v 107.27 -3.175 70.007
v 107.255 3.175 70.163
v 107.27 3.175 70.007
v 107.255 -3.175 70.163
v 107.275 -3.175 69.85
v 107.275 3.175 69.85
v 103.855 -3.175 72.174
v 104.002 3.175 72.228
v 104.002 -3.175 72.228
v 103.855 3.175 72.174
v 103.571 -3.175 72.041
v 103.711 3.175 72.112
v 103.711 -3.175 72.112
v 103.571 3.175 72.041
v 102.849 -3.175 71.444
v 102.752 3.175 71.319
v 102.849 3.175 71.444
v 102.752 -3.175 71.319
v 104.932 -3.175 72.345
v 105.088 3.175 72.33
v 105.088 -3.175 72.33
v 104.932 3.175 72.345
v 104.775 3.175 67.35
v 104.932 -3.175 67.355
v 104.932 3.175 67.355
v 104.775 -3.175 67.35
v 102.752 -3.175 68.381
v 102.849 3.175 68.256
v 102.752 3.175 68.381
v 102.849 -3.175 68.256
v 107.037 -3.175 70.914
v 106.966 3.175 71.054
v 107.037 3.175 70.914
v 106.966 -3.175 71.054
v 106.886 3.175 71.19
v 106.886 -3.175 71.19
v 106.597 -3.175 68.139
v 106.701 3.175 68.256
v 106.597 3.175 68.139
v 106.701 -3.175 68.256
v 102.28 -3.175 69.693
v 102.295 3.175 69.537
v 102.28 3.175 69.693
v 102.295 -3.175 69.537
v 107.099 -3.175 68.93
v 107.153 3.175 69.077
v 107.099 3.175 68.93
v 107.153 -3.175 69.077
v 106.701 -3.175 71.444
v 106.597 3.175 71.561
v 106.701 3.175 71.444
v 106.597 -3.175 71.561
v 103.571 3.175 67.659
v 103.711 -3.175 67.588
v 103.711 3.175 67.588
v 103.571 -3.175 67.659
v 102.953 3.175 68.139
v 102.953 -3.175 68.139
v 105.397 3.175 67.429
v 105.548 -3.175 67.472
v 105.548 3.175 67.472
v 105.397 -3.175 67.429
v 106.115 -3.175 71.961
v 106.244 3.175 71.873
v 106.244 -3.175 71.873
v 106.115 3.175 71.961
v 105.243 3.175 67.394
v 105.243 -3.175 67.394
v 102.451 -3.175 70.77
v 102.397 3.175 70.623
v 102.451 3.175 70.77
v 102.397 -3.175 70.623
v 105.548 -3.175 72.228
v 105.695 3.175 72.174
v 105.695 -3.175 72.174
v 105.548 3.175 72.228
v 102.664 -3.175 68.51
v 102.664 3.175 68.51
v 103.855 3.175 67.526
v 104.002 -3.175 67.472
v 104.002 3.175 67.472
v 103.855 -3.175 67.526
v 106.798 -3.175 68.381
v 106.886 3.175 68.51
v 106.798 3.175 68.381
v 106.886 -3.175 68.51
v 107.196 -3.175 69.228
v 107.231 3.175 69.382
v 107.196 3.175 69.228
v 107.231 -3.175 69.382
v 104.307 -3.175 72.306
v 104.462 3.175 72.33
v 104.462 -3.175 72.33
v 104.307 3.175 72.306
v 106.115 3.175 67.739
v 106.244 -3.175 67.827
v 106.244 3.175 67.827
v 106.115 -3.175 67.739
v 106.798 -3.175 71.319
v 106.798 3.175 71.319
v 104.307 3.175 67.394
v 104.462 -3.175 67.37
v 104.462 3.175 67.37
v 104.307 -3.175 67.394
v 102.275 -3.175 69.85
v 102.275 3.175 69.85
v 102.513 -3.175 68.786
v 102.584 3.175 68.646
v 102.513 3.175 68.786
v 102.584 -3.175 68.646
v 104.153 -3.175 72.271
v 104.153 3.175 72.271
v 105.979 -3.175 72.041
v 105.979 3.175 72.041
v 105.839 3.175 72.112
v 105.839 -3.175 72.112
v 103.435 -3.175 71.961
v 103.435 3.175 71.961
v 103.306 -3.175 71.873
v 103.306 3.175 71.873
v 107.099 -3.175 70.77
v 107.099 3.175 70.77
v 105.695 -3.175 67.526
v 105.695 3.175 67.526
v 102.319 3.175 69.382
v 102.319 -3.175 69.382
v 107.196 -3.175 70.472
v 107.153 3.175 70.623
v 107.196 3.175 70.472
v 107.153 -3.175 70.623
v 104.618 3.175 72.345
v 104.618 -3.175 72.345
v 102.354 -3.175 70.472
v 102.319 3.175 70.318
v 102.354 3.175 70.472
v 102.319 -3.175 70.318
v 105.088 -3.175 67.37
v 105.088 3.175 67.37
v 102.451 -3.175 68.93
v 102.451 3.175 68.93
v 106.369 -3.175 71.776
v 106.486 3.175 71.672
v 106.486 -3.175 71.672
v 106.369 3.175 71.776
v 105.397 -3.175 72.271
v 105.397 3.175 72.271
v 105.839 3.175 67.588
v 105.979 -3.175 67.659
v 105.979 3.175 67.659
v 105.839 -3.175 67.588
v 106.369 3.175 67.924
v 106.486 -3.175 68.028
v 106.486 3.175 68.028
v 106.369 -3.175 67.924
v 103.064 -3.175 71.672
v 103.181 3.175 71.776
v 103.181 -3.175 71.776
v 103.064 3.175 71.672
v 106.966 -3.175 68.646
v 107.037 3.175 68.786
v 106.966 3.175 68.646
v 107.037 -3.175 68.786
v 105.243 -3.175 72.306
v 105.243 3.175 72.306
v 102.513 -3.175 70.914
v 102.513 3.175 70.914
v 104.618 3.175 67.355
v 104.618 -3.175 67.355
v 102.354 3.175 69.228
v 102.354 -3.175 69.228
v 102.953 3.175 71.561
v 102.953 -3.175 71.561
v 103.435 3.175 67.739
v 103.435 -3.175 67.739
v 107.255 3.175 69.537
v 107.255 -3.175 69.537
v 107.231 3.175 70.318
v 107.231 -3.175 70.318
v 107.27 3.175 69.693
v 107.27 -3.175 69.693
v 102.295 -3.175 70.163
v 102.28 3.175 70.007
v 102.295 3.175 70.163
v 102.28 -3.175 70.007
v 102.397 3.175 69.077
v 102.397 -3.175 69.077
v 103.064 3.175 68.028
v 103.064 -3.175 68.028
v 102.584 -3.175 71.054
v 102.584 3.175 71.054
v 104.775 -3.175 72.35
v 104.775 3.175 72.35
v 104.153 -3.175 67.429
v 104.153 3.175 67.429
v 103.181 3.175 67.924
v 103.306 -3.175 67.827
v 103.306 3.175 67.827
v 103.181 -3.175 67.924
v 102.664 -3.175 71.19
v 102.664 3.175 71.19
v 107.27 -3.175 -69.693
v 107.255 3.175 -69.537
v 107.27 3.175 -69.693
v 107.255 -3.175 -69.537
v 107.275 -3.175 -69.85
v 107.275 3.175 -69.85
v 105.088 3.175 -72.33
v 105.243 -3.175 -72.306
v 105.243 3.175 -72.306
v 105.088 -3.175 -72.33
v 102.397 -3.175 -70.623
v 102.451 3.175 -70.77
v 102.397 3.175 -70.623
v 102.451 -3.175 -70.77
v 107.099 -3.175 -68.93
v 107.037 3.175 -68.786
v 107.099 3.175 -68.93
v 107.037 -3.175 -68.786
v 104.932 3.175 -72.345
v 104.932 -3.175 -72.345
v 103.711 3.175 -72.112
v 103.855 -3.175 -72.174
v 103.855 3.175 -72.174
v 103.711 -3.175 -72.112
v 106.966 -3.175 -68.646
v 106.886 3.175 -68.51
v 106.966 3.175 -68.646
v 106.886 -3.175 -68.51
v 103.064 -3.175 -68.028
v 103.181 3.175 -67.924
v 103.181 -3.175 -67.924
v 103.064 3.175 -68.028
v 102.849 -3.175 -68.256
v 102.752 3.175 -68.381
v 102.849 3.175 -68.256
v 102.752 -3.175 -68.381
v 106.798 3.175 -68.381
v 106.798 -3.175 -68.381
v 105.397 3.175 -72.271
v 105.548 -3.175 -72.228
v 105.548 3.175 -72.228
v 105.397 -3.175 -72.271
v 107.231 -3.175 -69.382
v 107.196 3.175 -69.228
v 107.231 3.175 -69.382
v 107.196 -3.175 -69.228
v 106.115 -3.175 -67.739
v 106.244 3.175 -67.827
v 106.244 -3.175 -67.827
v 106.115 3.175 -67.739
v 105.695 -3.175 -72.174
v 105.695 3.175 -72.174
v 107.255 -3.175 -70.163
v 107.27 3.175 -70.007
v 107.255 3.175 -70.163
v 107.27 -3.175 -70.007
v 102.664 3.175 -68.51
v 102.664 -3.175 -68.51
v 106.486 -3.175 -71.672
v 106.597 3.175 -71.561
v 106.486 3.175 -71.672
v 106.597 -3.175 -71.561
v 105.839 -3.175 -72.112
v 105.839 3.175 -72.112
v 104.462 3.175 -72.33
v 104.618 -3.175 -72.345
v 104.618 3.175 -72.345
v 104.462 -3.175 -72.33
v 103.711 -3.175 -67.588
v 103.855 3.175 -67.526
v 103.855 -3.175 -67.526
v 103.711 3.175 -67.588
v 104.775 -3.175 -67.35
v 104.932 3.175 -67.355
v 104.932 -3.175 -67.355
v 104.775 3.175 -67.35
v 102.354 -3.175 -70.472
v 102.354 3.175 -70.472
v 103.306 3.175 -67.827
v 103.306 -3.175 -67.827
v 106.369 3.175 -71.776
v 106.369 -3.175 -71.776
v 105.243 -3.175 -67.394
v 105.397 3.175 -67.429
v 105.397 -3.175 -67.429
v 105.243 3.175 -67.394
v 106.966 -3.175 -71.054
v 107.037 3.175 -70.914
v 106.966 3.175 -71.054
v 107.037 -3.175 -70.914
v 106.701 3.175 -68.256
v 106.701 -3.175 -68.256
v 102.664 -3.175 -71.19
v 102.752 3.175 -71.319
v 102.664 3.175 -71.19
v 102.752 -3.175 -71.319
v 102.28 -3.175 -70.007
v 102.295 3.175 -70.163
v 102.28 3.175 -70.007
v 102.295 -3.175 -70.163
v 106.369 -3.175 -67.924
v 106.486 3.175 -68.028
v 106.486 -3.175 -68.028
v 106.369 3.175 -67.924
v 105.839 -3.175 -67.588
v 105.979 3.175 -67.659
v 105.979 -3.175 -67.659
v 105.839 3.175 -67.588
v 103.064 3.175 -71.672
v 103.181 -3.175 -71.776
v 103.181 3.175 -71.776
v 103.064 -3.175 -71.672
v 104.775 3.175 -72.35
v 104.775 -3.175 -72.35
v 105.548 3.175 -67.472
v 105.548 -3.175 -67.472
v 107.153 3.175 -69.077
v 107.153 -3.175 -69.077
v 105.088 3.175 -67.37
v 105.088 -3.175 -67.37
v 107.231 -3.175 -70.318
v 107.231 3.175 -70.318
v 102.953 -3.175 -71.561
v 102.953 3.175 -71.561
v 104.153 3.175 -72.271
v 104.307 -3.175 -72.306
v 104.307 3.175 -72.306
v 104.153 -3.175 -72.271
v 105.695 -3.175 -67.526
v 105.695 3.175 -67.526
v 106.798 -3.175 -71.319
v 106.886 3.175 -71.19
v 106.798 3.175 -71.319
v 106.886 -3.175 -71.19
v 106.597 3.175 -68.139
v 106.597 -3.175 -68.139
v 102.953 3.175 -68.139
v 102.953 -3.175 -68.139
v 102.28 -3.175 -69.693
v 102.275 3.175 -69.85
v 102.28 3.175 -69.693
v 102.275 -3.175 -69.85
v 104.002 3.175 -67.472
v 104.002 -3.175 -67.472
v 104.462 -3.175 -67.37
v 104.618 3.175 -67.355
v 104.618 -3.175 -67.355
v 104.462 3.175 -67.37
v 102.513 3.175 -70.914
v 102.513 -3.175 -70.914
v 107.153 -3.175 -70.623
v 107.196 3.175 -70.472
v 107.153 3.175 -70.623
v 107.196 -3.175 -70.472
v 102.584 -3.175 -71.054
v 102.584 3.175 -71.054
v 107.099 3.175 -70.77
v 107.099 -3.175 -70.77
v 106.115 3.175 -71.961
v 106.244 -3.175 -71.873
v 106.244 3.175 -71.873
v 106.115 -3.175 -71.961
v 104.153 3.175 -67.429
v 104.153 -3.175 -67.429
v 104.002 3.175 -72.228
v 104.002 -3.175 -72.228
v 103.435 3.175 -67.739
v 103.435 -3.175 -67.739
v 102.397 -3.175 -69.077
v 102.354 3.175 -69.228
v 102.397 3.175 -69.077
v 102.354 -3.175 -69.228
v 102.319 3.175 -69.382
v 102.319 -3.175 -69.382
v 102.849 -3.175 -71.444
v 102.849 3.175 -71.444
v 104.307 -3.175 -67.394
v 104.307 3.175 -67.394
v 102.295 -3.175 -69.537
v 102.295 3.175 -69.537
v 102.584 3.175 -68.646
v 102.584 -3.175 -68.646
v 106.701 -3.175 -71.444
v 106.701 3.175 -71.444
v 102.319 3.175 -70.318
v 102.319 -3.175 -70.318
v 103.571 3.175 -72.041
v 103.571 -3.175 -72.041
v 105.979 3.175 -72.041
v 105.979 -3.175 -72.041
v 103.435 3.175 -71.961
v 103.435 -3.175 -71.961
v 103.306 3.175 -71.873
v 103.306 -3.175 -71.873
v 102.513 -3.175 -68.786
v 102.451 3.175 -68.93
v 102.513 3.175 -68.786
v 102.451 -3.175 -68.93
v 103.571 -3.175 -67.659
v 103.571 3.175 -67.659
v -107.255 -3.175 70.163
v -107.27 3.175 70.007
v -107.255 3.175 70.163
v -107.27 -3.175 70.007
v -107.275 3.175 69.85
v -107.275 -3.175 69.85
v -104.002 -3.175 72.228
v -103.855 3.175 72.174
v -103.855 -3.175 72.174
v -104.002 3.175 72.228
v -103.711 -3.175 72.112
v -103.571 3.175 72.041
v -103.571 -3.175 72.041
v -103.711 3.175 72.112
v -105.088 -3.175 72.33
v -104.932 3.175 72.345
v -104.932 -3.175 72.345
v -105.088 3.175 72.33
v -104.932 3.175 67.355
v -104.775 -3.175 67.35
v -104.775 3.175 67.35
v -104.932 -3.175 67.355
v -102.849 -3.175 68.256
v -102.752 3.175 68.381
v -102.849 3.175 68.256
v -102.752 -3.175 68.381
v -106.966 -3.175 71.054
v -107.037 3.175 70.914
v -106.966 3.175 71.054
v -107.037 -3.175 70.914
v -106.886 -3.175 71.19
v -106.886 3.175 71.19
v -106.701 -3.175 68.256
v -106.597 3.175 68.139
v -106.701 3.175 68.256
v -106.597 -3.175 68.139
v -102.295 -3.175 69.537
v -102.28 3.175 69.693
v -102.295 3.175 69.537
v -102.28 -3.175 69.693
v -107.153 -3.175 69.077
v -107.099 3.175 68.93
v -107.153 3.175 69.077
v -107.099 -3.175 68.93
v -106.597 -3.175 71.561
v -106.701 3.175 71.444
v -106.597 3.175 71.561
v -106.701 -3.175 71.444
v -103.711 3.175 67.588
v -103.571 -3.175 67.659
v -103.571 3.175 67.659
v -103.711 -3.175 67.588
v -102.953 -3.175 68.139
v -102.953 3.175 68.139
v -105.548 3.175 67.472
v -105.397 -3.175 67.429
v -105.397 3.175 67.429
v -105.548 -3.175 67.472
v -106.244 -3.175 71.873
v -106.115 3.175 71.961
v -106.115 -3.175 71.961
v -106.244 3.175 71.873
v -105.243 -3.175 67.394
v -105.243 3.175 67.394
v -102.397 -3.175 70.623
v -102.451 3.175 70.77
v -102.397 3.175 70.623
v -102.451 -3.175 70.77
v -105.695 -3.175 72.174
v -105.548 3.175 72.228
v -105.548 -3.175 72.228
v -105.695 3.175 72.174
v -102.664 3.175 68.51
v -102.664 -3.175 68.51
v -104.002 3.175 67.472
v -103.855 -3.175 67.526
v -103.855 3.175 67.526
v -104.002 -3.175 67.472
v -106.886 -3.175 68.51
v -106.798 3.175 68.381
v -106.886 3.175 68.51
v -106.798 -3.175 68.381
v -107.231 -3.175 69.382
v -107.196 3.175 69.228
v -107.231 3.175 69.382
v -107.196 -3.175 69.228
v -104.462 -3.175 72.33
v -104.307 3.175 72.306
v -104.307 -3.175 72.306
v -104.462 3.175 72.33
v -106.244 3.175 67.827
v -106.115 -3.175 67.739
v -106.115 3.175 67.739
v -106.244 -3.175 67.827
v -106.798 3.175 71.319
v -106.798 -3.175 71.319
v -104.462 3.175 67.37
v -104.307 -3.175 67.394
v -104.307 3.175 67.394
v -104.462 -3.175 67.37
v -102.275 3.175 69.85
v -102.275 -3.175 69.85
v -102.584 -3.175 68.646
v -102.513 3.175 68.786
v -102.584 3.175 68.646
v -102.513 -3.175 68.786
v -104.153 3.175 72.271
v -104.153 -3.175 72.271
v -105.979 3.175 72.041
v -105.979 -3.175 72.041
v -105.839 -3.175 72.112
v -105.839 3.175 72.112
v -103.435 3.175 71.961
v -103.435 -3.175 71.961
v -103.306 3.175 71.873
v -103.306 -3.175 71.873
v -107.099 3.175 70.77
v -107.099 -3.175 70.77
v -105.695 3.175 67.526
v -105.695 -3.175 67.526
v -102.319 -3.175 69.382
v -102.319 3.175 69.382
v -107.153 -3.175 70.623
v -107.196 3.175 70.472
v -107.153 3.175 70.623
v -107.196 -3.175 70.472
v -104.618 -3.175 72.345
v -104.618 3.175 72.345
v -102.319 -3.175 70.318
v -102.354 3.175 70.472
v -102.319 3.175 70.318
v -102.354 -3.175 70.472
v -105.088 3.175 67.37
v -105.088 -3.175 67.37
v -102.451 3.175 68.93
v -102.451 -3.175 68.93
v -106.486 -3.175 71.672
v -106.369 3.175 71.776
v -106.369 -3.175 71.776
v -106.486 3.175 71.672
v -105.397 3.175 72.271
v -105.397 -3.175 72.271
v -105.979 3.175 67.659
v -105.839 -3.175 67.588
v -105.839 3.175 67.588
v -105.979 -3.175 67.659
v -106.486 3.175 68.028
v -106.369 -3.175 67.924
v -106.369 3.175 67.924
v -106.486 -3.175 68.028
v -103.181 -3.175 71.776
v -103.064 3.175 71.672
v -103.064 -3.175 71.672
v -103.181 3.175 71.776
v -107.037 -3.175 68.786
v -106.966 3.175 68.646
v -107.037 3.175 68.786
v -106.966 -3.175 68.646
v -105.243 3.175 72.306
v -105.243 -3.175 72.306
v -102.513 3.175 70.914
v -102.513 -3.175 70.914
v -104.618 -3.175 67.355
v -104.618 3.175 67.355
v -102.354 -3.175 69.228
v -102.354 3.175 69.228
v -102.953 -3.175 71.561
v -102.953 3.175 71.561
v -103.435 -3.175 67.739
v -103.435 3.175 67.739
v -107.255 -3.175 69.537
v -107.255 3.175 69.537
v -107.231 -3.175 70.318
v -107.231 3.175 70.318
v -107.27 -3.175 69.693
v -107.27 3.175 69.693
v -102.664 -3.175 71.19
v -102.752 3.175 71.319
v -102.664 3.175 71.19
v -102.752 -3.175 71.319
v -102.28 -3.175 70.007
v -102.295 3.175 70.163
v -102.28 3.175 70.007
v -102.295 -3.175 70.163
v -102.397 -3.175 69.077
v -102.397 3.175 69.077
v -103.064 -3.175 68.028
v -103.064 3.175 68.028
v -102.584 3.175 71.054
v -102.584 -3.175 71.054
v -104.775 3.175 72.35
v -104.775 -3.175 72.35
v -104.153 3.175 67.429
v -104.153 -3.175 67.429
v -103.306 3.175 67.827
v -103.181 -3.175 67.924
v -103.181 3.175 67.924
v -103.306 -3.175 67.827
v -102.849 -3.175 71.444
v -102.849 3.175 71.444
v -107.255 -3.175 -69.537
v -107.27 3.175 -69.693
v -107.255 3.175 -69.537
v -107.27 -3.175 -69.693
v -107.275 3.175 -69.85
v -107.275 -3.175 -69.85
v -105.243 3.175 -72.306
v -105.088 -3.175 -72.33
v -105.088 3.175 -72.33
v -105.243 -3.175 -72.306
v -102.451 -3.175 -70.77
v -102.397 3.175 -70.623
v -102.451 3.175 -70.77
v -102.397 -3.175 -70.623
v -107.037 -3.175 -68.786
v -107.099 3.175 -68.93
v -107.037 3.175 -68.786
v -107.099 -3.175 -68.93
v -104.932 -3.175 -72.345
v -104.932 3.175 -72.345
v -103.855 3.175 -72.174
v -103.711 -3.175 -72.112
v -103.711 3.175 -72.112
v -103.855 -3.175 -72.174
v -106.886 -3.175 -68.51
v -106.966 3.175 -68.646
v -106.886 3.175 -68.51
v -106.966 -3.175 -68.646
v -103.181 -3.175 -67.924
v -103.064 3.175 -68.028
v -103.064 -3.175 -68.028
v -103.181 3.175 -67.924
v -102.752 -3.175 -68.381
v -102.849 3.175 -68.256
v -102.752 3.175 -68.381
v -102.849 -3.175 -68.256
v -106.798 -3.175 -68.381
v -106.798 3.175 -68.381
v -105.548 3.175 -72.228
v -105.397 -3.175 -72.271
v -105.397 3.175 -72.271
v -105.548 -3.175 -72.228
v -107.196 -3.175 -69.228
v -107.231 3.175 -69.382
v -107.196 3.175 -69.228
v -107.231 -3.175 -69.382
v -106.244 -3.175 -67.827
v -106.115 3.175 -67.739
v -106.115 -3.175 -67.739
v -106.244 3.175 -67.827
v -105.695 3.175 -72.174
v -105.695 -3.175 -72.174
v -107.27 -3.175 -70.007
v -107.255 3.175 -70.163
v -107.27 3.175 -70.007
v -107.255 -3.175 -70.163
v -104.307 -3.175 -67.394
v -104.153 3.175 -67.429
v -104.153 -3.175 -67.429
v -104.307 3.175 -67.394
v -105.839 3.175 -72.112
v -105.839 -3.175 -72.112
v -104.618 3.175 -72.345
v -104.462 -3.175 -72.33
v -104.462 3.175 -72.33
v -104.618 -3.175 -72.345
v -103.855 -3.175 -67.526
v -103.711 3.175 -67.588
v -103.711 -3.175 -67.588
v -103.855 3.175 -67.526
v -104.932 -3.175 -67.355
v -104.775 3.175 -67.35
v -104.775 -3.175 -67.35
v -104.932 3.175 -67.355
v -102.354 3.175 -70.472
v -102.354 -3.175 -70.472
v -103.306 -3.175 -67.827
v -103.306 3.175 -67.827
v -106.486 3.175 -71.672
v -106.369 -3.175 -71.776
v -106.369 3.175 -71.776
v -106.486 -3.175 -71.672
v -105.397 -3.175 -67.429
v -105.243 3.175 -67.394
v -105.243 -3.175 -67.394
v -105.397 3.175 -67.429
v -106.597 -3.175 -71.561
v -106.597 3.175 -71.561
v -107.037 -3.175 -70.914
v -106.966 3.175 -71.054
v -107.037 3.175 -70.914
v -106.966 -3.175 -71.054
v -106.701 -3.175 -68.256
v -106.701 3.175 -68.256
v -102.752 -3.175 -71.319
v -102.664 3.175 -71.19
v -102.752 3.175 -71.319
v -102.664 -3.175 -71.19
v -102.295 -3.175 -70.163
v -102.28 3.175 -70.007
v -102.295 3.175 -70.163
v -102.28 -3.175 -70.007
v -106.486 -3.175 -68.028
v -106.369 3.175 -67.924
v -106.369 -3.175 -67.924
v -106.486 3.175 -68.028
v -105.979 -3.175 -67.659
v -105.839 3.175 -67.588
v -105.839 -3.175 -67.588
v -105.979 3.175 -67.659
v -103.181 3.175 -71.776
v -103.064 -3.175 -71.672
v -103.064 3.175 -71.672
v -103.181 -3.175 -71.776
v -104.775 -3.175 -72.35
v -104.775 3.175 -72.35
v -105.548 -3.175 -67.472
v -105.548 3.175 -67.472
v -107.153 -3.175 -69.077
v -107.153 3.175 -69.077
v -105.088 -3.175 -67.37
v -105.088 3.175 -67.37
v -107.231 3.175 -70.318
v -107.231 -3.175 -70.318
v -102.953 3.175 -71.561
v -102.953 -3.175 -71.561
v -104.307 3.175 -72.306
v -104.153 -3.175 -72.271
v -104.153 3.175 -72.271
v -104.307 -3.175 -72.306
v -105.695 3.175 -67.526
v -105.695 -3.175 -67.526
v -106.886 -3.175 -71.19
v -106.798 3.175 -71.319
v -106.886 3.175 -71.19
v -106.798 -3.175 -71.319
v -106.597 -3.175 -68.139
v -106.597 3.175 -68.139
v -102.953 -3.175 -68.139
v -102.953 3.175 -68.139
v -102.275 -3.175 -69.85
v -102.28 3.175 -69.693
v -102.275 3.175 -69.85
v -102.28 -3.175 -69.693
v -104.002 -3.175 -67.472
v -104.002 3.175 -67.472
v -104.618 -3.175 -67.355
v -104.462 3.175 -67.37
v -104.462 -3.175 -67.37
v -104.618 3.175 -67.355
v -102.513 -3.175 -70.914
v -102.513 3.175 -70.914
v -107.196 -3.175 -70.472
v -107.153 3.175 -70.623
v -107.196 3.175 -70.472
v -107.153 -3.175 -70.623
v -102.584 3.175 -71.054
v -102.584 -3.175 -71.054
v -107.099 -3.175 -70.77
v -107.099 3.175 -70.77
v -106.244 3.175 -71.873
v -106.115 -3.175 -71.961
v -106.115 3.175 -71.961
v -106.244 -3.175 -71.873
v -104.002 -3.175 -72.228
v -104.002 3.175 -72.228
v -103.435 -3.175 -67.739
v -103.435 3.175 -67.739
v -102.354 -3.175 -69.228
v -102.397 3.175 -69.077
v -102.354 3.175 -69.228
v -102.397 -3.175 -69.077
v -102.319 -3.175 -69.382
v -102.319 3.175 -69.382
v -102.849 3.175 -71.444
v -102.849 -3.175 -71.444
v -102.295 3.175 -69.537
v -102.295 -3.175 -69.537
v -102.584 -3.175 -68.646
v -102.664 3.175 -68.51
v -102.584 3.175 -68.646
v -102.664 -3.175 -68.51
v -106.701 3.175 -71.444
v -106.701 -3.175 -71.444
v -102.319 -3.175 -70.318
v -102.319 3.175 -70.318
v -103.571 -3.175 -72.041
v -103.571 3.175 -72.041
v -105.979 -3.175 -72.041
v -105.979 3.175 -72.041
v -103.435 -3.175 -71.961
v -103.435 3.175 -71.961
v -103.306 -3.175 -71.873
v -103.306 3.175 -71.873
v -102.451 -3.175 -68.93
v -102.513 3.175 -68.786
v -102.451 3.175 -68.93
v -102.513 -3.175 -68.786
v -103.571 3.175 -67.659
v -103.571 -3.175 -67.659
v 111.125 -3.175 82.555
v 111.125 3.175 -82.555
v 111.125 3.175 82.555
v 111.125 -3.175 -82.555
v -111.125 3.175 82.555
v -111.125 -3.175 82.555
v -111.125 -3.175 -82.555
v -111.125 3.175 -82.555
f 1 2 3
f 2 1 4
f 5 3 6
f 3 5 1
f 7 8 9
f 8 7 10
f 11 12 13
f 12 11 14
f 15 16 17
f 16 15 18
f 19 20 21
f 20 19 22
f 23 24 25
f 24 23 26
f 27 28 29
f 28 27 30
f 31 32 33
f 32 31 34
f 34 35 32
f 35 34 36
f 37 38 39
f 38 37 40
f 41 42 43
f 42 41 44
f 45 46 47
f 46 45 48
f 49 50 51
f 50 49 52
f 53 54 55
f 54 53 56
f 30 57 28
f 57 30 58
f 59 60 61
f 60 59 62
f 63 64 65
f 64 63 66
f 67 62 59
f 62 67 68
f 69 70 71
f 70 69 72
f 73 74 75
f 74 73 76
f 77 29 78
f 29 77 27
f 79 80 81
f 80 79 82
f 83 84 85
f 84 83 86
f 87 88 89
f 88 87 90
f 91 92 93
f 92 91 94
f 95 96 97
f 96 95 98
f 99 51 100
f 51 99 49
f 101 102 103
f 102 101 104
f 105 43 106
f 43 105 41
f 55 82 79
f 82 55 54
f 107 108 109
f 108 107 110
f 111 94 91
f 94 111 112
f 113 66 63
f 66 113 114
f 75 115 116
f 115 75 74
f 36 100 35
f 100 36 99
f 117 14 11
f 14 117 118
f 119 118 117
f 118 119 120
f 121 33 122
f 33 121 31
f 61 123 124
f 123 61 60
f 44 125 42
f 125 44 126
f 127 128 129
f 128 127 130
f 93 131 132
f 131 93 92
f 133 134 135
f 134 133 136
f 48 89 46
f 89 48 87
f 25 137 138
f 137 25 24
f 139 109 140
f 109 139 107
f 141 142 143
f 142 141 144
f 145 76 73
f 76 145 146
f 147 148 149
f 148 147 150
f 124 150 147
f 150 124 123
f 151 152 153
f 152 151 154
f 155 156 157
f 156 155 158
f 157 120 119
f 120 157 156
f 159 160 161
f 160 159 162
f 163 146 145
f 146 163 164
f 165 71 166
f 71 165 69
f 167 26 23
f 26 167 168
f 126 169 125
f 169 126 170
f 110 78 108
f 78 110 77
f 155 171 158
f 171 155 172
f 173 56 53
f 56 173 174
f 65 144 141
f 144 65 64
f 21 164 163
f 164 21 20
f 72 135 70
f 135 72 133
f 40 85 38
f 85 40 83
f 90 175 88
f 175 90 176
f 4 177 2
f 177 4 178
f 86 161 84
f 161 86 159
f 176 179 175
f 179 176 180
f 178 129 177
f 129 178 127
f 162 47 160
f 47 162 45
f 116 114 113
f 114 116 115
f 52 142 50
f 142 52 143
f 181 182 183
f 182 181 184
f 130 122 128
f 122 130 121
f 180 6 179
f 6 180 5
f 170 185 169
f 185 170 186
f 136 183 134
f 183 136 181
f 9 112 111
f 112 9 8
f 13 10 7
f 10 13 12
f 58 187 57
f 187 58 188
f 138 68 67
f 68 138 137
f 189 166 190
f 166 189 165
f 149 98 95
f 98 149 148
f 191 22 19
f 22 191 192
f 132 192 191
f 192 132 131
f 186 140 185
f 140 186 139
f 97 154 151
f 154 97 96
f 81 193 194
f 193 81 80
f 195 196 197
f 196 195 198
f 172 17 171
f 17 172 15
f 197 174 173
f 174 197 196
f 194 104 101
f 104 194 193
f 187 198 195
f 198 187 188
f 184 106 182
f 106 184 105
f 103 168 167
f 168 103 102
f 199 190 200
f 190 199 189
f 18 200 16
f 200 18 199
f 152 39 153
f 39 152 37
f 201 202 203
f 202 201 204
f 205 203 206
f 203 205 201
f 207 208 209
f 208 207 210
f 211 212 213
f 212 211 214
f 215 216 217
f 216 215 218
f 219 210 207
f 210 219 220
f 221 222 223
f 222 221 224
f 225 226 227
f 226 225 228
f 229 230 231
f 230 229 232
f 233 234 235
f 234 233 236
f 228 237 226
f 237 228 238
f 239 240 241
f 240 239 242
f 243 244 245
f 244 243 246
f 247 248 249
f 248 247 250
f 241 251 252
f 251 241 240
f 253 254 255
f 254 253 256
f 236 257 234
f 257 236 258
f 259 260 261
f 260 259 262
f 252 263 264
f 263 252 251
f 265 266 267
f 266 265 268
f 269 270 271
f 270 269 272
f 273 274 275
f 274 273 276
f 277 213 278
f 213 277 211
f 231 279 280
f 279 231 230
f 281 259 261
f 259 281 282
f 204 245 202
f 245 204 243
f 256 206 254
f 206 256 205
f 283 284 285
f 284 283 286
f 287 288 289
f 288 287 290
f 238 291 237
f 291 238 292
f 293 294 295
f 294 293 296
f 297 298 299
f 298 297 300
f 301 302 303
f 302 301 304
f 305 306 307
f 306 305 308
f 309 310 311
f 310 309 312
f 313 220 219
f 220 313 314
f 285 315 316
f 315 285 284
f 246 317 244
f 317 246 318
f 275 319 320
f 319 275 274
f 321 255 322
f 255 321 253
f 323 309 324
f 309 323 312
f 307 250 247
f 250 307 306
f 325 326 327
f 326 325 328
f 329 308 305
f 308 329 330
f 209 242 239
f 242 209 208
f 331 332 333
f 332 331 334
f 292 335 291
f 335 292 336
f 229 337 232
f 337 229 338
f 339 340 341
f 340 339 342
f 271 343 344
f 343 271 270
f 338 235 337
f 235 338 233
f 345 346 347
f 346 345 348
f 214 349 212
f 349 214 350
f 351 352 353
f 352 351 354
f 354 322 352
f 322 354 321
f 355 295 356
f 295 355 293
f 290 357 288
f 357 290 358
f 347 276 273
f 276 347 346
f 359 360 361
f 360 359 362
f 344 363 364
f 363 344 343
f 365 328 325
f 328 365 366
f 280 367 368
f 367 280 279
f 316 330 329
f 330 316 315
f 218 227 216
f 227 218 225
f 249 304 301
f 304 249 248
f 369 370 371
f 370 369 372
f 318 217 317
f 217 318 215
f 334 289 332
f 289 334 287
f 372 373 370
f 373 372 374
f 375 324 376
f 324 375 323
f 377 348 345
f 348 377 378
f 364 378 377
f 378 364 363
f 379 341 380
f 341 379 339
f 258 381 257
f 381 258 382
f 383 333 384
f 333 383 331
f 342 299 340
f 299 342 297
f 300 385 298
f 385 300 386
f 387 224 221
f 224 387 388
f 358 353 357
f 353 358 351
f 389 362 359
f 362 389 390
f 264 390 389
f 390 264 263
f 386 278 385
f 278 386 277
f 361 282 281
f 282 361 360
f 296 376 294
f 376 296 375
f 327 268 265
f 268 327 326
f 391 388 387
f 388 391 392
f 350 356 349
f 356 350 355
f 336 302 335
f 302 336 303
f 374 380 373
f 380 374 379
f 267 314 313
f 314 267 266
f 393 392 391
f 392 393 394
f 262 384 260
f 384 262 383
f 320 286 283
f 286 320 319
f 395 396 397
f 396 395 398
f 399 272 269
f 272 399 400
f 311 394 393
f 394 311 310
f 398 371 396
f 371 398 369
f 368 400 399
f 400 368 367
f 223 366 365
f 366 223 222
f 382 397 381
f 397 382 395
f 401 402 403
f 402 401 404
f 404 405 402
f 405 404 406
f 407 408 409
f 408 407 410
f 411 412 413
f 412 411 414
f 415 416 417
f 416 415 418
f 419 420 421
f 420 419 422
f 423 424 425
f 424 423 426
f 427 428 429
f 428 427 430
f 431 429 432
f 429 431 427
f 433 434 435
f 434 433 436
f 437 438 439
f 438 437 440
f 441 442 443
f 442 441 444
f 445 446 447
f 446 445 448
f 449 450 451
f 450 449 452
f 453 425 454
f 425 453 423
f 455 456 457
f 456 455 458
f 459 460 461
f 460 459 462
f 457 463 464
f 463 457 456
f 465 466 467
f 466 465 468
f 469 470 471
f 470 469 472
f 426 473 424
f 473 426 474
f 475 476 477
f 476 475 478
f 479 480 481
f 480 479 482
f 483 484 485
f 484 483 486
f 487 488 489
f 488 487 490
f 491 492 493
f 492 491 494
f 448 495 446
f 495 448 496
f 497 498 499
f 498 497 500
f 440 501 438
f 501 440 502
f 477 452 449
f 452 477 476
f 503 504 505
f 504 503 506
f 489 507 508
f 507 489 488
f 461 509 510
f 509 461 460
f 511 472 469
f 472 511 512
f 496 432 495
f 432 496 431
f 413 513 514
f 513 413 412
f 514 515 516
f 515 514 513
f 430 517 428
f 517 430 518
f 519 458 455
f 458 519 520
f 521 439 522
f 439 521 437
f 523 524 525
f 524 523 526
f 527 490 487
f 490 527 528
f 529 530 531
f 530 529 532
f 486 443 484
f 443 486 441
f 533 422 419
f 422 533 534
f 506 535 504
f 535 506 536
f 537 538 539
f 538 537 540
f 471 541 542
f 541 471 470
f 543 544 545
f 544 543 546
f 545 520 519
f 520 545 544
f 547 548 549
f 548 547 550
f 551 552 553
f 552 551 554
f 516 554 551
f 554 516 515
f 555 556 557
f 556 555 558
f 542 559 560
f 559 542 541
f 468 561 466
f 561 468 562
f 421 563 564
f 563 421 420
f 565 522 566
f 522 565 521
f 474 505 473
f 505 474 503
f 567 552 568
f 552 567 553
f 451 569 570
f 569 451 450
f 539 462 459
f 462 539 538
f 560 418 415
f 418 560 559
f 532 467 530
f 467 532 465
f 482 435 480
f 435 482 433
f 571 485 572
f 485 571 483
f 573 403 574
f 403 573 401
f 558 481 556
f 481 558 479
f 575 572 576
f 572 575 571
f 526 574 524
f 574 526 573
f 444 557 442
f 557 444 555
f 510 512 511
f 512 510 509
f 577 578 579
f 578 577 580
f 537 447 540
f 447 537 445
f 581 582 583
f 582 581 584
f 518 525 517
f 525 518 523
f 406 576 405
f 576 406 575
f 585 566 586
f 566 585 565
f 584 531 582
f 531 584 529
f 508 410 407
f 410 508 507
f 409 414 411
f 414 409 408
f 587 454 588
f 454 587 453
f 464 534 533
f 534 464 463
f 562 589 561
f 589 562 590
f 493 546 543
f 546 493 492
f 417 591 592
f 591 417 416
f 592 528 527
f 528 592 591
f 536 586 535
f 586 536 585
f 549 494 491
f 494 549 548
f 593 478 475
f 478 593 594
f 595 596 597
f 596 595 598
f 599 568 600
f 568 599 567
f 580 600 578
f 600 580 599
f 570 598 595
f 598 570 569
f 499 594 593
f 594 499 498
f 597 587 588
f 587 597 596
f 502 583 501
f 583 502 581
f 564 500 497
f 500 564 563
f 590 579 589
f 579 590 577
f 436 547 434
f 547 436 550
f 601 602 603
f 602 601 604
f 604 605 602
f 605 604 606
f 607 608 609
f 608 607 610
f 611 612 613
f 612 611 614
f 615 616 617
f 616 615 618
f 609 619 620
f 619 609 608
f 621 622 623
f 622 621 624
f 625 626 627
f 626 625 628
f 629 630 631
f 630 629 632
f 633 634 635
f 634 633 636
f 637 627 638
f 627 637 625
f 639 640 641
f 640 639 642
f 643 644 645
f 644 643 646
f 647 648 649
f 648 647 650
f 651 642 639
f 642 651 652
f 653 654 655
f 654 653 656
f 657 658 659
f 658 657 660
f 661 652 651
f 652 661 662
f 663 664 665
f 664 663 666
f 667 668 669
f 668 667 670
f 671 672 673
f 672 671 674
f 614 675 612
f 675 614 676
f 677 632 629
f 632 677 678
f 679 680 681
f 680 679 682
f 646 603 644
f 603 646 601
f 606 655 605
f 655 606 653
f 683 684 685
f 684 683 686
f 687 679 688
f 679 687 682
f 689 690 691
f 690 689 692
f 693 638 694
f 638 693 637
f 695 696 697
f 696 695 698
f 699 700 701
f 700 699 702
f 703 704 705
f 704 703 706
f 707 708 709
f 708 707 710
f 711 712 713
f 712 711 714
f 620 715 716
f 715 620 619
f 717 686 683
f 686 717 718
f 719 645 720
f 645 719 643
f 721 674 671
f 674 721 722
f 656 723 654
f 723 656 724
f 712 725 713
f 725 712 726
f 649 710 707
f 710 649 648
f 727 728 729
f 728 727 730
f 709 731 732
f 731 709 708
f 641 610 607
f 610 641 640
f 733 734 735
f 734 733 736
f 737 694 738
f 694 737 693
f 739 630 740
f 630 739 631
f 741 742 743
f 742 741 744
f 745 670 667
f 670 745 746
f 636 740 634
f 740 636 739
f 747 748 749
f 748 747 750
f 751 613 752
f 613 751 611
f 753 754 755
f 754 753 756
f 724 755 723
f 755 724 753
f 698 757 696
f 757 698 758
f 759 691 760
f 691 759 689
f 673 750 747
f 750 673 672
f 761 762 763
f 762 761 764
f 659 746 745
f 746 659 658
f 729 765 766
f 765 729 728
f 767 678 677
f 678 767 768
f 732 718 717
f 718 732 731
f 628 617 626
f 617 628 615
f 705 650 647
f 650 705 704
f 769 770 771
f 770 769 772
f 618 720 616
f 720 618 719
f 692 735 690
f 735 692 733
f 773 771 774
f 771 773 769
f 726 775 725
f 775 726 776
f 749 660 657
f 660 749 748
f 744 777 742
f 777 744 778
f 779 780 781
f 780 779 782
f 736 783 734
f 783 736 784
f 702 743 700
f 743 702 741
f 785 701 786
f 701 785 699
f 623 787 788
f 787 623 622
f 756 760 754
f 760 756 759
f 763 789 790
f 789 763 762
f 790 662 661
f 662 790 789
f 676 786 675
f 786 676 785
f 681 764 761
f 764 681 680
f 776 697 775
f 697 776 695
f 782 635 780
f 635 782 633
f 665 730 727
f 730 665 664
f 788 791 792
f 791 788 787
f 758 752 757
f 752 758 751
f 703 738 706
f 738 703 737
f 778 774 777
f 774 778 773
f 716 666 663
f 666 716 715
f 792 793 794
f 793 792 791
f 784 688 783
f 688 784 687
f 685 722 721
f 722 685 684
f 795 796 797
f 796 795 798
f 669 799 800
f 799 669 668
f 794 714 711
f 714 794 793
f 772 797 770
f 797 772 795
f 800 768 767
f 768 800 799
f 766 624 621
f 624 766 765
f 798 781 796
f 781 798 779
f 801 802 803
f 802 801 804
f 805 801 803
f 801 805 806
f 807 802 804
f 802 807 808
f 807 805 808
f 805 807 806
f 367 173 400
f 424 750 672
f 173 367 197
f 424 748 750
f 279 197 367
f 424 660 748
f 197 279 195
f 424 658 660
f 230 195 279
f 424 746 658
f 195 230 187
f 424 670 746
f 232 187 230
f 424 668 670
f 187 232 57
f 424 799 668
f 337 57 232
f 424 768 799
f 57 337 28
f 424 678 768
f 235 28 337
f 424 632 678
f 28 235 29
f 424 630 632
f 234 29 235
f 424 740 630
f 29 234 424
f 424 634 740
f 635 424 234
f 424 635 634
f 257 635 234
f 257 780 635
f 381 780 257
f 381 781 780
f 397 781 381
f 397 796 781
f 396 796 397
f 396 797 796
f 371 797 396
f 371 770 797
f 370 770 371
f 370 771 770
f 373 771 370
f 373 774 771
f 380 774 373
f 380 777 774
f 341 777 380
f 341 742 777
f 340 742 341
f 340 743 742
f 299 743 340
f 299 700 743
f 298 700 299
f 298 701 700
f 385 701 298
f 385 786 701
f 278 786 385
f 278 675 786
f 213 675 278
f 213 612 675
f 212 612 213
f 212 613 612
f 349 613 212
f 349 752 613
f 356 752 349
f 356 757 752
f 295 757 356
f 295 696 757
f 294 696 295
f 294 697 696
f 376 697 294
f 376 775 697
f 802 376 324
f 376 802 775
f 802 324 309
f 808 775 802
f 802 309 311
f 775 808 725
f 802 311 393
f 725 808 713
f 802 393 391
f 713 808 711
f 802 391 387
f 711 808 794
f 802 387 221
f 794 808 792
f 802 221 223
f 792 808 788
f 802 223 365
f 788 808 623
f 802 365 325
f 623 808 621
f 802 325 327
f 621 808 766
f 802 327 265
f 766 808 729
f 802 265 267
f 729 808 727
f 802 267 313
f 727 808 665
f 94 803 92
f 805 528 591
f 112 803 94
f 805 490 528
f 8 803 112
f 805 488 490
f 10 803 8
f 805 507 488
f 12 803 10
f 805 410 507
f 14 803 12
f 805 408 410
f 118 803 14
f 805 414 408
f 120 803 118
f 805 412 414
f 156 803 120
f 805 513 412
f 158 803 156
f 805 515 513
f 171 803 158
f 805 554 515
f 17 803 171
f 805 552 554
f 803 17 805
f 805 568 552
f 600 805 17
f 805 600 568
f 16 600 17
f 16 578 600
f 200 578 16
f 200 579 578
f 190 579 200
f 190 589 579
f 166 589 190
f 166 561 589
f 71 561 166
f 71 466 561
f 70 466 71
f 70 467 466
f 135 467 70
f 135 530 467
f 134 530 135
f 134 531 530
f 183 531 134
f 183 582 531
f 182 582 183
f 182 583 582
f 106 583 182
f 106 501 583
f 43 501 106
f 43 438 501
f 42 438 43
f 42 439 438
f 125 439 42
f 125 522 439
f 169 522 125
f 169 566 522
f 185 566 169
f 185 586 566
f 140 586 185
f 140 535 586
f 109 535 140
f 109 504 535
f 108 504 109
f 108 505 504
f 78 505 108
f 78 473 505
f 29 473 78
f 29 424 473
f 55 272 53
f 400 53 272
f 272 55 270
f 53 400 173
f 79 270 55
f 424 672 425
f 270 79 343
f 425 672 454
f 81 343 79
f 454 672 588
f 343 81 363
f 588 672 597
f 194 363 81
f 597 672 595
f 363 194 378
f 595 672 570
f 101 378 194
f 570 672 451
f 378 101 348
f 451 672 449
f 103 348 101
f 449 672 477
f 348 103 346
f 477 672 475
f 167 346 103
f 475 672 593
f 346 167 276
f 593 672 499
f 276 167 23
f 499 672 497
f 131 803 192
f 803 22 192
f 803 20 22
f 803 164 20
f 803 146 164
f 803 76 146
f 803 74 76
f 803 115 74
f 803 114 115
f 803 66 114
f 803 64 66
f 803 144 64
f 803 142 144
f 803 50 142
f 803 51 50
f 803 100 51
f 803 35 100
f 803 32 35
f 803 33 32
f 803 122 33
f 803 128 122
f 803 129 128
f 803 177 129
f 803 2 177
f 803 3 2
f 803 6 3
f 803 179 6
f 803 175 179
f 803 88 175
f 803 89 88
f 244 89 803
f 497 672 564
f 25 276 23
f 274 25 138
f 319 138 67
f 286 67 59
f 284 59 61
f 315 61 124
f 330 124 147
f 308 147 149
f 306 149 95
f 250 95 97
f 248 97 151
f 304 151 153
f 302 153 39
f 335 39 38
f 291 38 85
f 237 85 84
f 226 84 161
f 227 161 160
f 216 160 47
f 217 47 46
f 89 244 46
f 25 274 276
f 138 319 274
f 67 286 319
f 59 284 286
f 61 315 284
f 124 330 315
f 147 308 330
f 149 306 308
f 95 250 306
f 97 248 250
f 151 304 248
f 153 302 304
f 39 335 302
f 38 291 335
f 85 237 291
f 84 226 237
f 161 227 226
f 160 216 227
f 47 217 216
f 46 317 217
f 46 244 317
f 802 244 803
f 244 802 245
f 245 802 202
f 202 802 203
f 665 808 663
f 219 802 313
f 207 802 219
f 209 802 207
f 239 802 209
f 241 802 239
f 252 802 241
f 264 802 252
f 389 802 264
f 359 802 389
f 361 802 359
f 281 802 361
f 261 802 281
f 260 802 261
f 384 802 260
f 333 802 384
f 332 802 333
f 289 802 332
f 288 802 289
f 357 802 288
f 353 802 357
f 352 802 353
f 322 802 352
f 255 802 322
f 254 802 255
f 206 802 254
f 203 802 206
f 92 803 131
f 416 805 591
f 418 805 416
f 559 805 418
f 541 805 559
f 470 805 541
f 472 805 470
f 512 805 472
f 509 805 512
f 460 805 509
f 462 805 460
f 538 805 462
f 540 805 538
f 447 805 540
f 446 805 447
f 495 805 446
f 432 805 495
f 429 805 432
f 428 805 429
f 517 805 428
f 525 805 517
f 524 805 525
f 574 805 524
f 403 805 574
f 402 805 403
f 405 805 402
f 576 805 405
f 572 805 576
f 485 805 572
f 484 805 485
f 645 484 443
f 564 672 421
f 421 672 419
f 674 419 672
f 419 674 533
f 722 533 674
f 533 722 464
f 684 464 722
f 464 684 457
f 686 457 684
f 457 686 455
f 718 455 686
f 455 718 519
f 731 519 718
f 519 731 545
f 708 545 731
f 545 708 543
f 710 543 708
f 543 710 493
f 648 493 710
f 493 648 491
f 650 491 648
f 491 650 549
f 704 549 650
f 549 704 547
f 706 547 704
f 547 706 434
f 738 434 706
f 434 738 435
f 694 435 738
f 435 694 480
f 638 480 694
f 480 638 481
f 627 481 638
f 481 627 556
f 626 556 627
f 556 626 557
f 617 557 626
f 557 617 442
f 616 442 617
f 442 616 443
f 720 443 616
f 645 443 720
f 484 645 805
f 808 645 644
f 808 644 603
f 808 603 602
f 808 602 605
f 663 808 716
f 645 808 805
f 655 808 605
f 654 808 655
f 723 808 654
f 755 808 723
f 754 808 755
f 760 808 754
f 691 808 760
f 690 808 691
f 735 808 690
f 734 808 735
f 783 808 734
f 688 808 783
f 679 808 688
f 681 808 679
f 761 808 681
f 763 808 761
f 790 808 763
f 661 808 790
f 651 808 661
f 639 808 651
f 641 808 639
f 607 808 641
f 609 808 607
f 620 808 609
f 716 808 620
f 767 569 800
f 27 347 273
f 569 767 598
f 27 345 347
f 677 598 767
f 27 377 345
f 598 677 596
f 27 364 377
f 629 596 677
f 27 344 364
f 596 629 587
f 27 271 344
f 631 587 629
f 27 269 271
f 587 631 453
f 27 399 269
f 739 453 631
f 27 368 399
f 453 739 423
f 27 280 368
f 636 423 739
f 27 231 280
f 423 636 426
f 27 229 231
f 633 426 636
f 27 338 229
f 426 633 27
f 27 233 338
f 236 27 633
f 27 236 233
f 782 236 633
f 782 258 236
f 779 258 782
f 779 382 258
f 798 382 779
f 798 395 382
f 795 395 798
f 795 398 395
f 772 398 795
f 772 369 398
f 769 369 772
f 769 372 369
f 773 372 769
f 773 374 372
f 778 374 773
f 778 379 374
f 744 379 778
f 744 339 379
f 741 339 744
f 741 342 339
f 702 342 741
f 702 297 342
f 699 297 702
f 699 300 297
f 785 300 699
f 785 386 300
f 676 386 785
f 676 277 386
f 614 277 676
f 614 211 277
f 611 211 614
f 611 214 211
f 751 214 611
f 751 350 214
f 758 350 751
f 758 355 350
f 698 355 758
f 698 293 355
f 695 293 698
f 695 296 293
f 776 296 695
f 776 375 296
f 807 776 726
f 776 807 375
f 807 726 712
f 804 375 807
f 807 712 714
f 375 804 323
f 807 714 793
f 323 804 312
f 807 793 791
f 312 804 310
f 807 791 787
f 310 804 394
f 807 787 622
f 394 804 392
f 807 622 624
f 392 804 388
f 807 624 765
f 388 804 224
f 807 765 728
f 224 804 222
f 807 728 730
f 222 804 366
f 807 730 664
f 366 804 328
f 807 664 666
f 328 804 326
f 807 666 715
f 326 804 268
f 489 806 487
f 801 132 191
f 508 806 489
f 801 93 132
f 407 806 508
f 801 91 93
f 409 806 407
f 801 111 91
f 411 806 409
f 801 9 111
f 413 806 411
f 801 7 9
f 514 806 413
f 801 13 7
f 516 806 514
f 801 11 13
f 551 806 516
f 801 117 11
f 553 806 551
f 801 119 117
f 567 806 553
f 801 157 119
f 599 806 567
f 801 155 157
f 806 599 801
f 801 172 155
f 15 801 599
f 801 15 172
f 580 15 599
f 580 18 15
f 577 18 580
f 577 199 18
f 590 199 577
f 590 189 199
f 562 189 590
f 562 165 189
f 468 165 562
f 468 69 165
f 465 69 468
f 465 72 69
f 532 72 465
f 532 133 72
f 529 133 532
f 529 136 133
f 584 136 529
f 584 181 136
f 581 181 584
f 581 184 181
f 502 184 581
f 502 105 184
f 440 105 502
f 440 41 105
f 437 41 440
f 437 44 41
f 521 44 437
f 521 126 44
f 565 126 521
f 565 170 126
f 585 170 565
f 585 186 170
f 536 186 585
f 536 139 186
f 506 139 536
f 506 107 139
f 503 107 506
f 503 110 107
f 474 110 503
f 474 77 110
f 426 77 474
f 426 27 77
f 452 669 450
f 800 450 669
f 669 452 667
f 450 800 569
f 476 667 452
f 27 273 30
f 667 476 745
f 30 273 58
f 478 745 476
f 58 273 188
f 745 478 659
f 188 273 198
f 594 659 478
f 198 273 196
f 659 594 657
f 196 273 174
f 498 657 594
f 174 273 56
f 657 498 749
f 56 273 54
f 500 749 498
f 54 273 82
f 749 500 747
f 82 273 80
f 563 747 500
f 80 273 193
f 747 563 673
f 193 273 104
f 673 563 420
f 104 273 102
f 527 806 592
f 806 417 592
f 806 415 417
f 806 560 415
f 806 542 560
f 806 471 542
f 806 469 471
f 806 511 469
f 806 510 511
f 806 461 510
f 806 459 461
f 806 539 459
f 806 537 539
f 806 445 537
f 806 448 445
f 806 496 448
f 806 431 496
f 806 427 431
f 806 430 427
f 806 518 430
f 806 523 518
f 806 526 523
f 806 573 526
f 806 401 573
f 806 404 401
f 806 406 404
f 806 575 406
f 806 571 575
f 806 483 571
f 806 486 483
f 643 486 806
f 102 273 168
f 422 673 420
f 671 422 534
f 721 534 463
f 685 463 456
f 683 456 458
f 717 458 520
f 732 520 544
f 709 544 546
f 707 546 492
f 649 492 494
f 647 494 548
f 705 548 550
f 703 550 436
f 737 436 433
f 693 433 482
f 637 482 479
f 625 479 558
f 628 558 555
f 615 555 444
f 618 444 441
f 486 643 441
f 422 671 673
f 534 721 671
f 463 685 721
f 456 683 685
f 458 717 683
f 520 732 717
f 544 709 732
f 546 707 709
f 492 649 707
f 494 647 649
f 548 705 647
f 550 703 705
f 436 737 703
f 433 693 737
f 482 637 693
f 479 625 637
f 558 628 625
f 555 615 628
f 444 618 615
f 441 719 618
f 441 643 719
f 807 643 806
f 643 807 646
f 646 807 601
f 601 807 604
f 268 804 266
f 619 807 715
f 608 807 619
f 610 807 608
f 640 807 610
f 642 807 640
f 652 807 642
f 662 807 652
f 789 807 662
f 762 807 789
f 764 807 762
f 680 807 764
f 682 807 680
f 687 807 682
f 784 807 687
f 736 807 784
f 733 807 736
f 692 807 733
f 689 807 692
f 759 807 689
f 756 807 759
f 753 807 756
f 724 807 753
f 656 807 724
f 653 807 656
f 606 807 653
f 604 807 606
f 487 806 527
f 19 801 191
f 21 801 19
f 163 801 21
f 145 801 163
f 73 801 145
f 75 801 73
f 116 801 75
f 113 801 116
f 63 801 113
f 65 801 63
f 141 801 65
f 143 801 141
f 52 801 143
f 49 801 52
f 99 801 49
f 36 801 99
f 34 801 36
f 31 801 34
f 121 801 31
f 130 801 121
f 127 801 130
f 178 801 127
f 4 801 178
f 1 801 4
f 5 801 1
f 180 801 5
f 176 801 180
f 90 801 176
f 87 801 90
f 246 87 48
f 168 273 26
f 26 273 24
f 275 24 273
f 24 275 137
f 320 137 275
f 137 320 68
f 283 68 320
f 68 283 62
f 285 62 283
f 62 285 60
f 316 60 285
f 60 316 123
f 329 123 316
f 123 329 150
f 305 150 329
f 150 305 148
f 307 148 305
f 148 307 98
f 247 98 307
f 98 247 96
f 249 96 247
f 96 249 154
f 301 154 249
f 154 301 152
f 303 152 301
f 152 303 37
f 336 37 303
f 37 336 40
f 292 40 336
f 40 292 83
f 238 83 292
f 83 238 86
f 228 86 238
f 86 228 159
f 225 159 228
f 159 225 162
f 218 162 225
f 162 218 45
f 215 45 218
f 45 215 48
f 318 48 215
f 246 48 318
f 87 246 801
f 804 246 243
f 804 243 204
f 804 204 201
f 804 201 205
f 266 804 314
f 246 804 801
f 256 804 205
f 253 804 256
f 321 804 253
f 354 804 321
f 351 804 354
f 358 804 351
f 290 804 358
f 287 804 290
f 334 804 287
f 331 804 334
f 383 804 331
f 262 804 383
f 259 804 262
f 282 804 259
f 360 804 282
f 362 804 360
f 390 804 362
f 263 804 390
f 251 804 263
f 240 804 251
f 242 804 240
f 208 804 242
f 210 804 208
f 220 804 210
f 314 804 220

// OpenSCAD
// file: variables.scad
// Global
overlap = 0.01; 
centered = true;
$fn = 100;
in = 25.4;
cm = 10;
mm = 1;
thickness = 0.25 *in;

// Head
head_radius = 3 *in;
head_translation = 6 *in;
head_depth = 8 *in;
head_thickness = 0.25 *in;
head_height = head_radius * 2;
head_width = head_radius * 2 + head_translation;

// Chest
chest_width = 8.5 * in; 
chest_height = 6 *in; 
chest_offset = 1 *in;
chest_depth = 6.5 *in; 
chest_thickness = 0.25 *in;

// Base 
base_width = 8.5 *in;
base_height = 6 *in;
base_offset = 1 *in;
base_depth = 140 *mm;
base_top_width = 108 *mm;
base_top_height = 76 *mm;
base_top_depth = 55 *mm;
base_top_offset = 1 *in;
base_thickness = 0.25 *in;
base_divot_width = 70 *mm;
base_divot_height = 15 *mm;
base_divot_depth = 50 *mm;
caster_hole_diameter = 5*mm;
caster_hole_from_width1 = 3 *mm + caster_hole_diameter/2;
caster_hole_from_width2 = 2.5 *mm + caster_hole_diameter/2;
caster_hole_from_height = 8.5 *mm + caster_hole_diameter/2;

// Shoulder
shoulder_diameter = 2 *in;
shoulder_translation = 1.50 *in;
shoulder_height = 2 *in;
shoulder_thickness = thickness;
shoulder_mount_thickness = thickness;

// Rim
rim_thickness = 0.125 *in;
rim_depth = 0.75 *in;

// Camera
cam_radius = 0.25 *in;
cam_depth = 3 *in;
cam_height = head_radius/4;
cam_distance = head_translation;

// Plate
plate_width = head_translation-cam_radius*2;
plate_depth = head_depth/2; 
plate_height = head_radius-cam_height;
plate_thickness = head_thickness;

// Microphone
mic_radius = 3 *cm;
mic_height = 0.5 *in;

// Vents
vent_radius = 0.2 *in;
vent_depth = 1 *in;

// Neck
neck_width = 3 *cm;
neck_height = 3.5 *cm;
neck_depth = 5 *cm;
neck_offset = 10;
neck_thickness = thickness;

//Microcomputer
raspi_width = 85;
raspi_depth = 56;
raspi_height = 17;

// Spine
spine_width = 4 *cm;
spine_height = 4.5 *cm;
spine_depth = 19 *in;
spine_mount_thickness = 0.25 *cm;
spine_mount_hole = 6 *mm;
spine_mount_diameter = 2.1 *cm;
spine_mount_depth = 2.5 *cm;

// Base Spine Mount
spine_bottom_height = 0.75 *in;
spine_bottom_width = 0.75 *in;
spine_bottom_depth = 0.75 *in;
spine_bottom_translation = 0.4 *in;

spine_base_width = 1.6 *in;
spine_base_height = 3.1 *in; 
spine_base_depth = 4 *in;
spine_base_thickness = 0.25 *in*2;

spine_cord_width = 1 *in;
spine_cord_height = 1 *in;
spine_cord_depth =  1 *in;

// Speaker 
speaker_width = 4.33 *in;
speaker_depth = 4.13 *in;
speaker_height = 3.5 *in;

// Motor Driver
driver_height = 3.75 *in;
driver_width  = 1.1 *in;
driver_depth  = 2.75 *in; 

// Power Supply
psu_height = 8.5 *in;
psu_width = 4.5 *in;
psu_depth = 2 *in;
power_supply_width = 5 *in;
power_supply_depth = 2.5 *cm;
power_supply_height = base_thickness*2;

// Steppers 
frame_width = 57 *mm; 
frame_height = 57 *mm;
frame_depth = 56 *mm; 
emboss_height = 1.6 *mm;
emboss_diameter = 38.1 *mm;
shaft_length = 21.5 *mm;
shaft_divot_height = 15.25 *mm;
shaft_divot_width  = 0.4 *mm;
shaft_diameter = 6.35 *mm;
large_shaft_diameter = 0.6 *in;
arm_clamp_thickness = 0.25 *in;

// Screws
screw_type = "M3";
screw_distance = 0.06 *in;
m3_screw_thread_depth = 7;
m3_screw_thread_diameter = 3;
m3_screw_head_depth = 3.5;
m3_screw_head_diameter = 7;
nema23_screw_diameter = 5 *mm;
nema23_screw_distance = 47 *mm;

// Ender 3 Build Volume
ender_3_width = 220 *mm;
ender_3_height = 220 *mm;
ender_3_depth = 250 *mm;

// Wheels
wheel_diameter = 7 *in;
wheel_width = 1.5 *in;

// Shaft Mount
arm_clamp_width = 10 *mm;
arm_clamp_depth = shaft_diameter+thickness;
arm_clamp_height = shaft_diameter+thickness*2;

// Arm Integrated Lead Screw Stepper 
integrated_stepper_width = 42.3 *mm;
integrated_stepper_height = 42.3 *mm;
integrated_stepper_depth = 39.5 *mm;
integrated_emboss_height = 2 *mm;
integrated_emboss_diameter = 22 *mm;
integrated_port_height = 7 *mm;
integrated_port_width = 16 *mm;
integrated_port_depth = 9.6 *mm;
lead_screw_diameter = 10 *mm;
lead_screw_length = 200 *mm; 
lead_nut_diameter = 22 *mm;
lead_nut_height = 3.8 *mm;
nema17_screw_distance = 31 *mm;
nema17_screw_diameter = undef;

// Arm
arm_thickness = thickness;
arm_height = integrated_stepper_height + arm_thickness;
arm_depth =  lead_screw_length;
arm_width = integrated_stepper_width + arm_thickness;
arm_clamp_offset = 10;

// Stepper Module
module NEMA23(){	

	// Emboss
	translate([0,0,frame_depth/2+emboss_height/2])
	cylinder(h=emboss_height,d=emboss_diameter,center=centered);

	// Shaft
	difference(){
		translate([0,0,frame_depth/2+shaft_length/2])
			cylinder(h=shaft_length,d=shaft_diameter,center=centered);
		translate([-shaft_diameter/2+shaft_divot_width/2,0,-shaft_divot_height/2+frame_depth/2+shaft_length])
		cube([shaft_divot_width,shaft_diameter, shaft_divot_height+overlap],center=centered);
	}

	// Frame
	cube([frame_width,frame_height,frame_depth], center=centered);

	// Screws
	for(screw_distance=[-nema23_screw_distance/2:nema23_screw_distance/2:nema23_screw_distance/2]){
		translate([screw_distance,screw_distance,frame_depth/2])
		cylinder(h=emboss_height+thickness,d=nema23_screw_diameter);
		translate([-screw_distance,screw_distance,frame_depth/2])
		cylinder(h=emboss_height+thickness,d=nema23_screw_diameter);		
	}
}

// Integrated Stepper Module
module NEMA17(){	

	// Emboss
	translate([0,0,integrated_stepper_depth/2+integrated_emboss_height/2])
	cylinder(h=integrated_emboss_height,d=integrated_emboss_diameter,center=centered);

	// Lead Screw
	difference(){
		translate([0,0,integrated_stepper_depth/2+lead_screw_length/2])
			cylinder(h=lead_screw_length,d=lead_screw_diameter,center=centered);
	}

	// Frame
	cube([integrated_stepper_width,integrated_stepper_height,integrated_stepper_depth], center=centered);

	// Screws
	for(screw_distance=[-nema17_screw_distance/2:nema17_screw_distance/2:nema17_screw_distance/2]){
		translate([screw_distance,screw_distance,integrated_stepper_depth/2])
		cylinder(h=integrated_emboss_height+thickness,d=nema17_screw_diameter);
		translate([-screw_distance,screw_distance,integrated_stepper_depth/2])
		cylinder(h=integrated_emboss_height+thickness,d=nema17_screw_diameter);		
	}
} 
// main file
// Lib
include <variables.scad>;

// Module
module chest_backplate(){

	// Chest Backplate Positive
	difference(){
		cube([chest_width+chest_thickness,chest_thickness, chest_depth+overlap],center=centered);

		// Chest Backplate Screw Negatives
		for(mirrored=[0:1]){
			mirror([mirrored,0,0]){
				translate([chest_width/2-chest_thickness/2,chest_thickness,chest_height/2-chest_thickness])
					rotate([90,0,0])
						cylinder(h=chest_thickness*2, d=nema23_screw_diameter);
				translate([chest_width/2-chest_thickness/2,chest_thickness,-chest_height/2+chest_thickness])
					rotate([90,0,0])
						cylinder(h=chest_thickness*2, d=nema23_screw_diameter);
			}
		}
	}
}

// Call
chest_backplate();
